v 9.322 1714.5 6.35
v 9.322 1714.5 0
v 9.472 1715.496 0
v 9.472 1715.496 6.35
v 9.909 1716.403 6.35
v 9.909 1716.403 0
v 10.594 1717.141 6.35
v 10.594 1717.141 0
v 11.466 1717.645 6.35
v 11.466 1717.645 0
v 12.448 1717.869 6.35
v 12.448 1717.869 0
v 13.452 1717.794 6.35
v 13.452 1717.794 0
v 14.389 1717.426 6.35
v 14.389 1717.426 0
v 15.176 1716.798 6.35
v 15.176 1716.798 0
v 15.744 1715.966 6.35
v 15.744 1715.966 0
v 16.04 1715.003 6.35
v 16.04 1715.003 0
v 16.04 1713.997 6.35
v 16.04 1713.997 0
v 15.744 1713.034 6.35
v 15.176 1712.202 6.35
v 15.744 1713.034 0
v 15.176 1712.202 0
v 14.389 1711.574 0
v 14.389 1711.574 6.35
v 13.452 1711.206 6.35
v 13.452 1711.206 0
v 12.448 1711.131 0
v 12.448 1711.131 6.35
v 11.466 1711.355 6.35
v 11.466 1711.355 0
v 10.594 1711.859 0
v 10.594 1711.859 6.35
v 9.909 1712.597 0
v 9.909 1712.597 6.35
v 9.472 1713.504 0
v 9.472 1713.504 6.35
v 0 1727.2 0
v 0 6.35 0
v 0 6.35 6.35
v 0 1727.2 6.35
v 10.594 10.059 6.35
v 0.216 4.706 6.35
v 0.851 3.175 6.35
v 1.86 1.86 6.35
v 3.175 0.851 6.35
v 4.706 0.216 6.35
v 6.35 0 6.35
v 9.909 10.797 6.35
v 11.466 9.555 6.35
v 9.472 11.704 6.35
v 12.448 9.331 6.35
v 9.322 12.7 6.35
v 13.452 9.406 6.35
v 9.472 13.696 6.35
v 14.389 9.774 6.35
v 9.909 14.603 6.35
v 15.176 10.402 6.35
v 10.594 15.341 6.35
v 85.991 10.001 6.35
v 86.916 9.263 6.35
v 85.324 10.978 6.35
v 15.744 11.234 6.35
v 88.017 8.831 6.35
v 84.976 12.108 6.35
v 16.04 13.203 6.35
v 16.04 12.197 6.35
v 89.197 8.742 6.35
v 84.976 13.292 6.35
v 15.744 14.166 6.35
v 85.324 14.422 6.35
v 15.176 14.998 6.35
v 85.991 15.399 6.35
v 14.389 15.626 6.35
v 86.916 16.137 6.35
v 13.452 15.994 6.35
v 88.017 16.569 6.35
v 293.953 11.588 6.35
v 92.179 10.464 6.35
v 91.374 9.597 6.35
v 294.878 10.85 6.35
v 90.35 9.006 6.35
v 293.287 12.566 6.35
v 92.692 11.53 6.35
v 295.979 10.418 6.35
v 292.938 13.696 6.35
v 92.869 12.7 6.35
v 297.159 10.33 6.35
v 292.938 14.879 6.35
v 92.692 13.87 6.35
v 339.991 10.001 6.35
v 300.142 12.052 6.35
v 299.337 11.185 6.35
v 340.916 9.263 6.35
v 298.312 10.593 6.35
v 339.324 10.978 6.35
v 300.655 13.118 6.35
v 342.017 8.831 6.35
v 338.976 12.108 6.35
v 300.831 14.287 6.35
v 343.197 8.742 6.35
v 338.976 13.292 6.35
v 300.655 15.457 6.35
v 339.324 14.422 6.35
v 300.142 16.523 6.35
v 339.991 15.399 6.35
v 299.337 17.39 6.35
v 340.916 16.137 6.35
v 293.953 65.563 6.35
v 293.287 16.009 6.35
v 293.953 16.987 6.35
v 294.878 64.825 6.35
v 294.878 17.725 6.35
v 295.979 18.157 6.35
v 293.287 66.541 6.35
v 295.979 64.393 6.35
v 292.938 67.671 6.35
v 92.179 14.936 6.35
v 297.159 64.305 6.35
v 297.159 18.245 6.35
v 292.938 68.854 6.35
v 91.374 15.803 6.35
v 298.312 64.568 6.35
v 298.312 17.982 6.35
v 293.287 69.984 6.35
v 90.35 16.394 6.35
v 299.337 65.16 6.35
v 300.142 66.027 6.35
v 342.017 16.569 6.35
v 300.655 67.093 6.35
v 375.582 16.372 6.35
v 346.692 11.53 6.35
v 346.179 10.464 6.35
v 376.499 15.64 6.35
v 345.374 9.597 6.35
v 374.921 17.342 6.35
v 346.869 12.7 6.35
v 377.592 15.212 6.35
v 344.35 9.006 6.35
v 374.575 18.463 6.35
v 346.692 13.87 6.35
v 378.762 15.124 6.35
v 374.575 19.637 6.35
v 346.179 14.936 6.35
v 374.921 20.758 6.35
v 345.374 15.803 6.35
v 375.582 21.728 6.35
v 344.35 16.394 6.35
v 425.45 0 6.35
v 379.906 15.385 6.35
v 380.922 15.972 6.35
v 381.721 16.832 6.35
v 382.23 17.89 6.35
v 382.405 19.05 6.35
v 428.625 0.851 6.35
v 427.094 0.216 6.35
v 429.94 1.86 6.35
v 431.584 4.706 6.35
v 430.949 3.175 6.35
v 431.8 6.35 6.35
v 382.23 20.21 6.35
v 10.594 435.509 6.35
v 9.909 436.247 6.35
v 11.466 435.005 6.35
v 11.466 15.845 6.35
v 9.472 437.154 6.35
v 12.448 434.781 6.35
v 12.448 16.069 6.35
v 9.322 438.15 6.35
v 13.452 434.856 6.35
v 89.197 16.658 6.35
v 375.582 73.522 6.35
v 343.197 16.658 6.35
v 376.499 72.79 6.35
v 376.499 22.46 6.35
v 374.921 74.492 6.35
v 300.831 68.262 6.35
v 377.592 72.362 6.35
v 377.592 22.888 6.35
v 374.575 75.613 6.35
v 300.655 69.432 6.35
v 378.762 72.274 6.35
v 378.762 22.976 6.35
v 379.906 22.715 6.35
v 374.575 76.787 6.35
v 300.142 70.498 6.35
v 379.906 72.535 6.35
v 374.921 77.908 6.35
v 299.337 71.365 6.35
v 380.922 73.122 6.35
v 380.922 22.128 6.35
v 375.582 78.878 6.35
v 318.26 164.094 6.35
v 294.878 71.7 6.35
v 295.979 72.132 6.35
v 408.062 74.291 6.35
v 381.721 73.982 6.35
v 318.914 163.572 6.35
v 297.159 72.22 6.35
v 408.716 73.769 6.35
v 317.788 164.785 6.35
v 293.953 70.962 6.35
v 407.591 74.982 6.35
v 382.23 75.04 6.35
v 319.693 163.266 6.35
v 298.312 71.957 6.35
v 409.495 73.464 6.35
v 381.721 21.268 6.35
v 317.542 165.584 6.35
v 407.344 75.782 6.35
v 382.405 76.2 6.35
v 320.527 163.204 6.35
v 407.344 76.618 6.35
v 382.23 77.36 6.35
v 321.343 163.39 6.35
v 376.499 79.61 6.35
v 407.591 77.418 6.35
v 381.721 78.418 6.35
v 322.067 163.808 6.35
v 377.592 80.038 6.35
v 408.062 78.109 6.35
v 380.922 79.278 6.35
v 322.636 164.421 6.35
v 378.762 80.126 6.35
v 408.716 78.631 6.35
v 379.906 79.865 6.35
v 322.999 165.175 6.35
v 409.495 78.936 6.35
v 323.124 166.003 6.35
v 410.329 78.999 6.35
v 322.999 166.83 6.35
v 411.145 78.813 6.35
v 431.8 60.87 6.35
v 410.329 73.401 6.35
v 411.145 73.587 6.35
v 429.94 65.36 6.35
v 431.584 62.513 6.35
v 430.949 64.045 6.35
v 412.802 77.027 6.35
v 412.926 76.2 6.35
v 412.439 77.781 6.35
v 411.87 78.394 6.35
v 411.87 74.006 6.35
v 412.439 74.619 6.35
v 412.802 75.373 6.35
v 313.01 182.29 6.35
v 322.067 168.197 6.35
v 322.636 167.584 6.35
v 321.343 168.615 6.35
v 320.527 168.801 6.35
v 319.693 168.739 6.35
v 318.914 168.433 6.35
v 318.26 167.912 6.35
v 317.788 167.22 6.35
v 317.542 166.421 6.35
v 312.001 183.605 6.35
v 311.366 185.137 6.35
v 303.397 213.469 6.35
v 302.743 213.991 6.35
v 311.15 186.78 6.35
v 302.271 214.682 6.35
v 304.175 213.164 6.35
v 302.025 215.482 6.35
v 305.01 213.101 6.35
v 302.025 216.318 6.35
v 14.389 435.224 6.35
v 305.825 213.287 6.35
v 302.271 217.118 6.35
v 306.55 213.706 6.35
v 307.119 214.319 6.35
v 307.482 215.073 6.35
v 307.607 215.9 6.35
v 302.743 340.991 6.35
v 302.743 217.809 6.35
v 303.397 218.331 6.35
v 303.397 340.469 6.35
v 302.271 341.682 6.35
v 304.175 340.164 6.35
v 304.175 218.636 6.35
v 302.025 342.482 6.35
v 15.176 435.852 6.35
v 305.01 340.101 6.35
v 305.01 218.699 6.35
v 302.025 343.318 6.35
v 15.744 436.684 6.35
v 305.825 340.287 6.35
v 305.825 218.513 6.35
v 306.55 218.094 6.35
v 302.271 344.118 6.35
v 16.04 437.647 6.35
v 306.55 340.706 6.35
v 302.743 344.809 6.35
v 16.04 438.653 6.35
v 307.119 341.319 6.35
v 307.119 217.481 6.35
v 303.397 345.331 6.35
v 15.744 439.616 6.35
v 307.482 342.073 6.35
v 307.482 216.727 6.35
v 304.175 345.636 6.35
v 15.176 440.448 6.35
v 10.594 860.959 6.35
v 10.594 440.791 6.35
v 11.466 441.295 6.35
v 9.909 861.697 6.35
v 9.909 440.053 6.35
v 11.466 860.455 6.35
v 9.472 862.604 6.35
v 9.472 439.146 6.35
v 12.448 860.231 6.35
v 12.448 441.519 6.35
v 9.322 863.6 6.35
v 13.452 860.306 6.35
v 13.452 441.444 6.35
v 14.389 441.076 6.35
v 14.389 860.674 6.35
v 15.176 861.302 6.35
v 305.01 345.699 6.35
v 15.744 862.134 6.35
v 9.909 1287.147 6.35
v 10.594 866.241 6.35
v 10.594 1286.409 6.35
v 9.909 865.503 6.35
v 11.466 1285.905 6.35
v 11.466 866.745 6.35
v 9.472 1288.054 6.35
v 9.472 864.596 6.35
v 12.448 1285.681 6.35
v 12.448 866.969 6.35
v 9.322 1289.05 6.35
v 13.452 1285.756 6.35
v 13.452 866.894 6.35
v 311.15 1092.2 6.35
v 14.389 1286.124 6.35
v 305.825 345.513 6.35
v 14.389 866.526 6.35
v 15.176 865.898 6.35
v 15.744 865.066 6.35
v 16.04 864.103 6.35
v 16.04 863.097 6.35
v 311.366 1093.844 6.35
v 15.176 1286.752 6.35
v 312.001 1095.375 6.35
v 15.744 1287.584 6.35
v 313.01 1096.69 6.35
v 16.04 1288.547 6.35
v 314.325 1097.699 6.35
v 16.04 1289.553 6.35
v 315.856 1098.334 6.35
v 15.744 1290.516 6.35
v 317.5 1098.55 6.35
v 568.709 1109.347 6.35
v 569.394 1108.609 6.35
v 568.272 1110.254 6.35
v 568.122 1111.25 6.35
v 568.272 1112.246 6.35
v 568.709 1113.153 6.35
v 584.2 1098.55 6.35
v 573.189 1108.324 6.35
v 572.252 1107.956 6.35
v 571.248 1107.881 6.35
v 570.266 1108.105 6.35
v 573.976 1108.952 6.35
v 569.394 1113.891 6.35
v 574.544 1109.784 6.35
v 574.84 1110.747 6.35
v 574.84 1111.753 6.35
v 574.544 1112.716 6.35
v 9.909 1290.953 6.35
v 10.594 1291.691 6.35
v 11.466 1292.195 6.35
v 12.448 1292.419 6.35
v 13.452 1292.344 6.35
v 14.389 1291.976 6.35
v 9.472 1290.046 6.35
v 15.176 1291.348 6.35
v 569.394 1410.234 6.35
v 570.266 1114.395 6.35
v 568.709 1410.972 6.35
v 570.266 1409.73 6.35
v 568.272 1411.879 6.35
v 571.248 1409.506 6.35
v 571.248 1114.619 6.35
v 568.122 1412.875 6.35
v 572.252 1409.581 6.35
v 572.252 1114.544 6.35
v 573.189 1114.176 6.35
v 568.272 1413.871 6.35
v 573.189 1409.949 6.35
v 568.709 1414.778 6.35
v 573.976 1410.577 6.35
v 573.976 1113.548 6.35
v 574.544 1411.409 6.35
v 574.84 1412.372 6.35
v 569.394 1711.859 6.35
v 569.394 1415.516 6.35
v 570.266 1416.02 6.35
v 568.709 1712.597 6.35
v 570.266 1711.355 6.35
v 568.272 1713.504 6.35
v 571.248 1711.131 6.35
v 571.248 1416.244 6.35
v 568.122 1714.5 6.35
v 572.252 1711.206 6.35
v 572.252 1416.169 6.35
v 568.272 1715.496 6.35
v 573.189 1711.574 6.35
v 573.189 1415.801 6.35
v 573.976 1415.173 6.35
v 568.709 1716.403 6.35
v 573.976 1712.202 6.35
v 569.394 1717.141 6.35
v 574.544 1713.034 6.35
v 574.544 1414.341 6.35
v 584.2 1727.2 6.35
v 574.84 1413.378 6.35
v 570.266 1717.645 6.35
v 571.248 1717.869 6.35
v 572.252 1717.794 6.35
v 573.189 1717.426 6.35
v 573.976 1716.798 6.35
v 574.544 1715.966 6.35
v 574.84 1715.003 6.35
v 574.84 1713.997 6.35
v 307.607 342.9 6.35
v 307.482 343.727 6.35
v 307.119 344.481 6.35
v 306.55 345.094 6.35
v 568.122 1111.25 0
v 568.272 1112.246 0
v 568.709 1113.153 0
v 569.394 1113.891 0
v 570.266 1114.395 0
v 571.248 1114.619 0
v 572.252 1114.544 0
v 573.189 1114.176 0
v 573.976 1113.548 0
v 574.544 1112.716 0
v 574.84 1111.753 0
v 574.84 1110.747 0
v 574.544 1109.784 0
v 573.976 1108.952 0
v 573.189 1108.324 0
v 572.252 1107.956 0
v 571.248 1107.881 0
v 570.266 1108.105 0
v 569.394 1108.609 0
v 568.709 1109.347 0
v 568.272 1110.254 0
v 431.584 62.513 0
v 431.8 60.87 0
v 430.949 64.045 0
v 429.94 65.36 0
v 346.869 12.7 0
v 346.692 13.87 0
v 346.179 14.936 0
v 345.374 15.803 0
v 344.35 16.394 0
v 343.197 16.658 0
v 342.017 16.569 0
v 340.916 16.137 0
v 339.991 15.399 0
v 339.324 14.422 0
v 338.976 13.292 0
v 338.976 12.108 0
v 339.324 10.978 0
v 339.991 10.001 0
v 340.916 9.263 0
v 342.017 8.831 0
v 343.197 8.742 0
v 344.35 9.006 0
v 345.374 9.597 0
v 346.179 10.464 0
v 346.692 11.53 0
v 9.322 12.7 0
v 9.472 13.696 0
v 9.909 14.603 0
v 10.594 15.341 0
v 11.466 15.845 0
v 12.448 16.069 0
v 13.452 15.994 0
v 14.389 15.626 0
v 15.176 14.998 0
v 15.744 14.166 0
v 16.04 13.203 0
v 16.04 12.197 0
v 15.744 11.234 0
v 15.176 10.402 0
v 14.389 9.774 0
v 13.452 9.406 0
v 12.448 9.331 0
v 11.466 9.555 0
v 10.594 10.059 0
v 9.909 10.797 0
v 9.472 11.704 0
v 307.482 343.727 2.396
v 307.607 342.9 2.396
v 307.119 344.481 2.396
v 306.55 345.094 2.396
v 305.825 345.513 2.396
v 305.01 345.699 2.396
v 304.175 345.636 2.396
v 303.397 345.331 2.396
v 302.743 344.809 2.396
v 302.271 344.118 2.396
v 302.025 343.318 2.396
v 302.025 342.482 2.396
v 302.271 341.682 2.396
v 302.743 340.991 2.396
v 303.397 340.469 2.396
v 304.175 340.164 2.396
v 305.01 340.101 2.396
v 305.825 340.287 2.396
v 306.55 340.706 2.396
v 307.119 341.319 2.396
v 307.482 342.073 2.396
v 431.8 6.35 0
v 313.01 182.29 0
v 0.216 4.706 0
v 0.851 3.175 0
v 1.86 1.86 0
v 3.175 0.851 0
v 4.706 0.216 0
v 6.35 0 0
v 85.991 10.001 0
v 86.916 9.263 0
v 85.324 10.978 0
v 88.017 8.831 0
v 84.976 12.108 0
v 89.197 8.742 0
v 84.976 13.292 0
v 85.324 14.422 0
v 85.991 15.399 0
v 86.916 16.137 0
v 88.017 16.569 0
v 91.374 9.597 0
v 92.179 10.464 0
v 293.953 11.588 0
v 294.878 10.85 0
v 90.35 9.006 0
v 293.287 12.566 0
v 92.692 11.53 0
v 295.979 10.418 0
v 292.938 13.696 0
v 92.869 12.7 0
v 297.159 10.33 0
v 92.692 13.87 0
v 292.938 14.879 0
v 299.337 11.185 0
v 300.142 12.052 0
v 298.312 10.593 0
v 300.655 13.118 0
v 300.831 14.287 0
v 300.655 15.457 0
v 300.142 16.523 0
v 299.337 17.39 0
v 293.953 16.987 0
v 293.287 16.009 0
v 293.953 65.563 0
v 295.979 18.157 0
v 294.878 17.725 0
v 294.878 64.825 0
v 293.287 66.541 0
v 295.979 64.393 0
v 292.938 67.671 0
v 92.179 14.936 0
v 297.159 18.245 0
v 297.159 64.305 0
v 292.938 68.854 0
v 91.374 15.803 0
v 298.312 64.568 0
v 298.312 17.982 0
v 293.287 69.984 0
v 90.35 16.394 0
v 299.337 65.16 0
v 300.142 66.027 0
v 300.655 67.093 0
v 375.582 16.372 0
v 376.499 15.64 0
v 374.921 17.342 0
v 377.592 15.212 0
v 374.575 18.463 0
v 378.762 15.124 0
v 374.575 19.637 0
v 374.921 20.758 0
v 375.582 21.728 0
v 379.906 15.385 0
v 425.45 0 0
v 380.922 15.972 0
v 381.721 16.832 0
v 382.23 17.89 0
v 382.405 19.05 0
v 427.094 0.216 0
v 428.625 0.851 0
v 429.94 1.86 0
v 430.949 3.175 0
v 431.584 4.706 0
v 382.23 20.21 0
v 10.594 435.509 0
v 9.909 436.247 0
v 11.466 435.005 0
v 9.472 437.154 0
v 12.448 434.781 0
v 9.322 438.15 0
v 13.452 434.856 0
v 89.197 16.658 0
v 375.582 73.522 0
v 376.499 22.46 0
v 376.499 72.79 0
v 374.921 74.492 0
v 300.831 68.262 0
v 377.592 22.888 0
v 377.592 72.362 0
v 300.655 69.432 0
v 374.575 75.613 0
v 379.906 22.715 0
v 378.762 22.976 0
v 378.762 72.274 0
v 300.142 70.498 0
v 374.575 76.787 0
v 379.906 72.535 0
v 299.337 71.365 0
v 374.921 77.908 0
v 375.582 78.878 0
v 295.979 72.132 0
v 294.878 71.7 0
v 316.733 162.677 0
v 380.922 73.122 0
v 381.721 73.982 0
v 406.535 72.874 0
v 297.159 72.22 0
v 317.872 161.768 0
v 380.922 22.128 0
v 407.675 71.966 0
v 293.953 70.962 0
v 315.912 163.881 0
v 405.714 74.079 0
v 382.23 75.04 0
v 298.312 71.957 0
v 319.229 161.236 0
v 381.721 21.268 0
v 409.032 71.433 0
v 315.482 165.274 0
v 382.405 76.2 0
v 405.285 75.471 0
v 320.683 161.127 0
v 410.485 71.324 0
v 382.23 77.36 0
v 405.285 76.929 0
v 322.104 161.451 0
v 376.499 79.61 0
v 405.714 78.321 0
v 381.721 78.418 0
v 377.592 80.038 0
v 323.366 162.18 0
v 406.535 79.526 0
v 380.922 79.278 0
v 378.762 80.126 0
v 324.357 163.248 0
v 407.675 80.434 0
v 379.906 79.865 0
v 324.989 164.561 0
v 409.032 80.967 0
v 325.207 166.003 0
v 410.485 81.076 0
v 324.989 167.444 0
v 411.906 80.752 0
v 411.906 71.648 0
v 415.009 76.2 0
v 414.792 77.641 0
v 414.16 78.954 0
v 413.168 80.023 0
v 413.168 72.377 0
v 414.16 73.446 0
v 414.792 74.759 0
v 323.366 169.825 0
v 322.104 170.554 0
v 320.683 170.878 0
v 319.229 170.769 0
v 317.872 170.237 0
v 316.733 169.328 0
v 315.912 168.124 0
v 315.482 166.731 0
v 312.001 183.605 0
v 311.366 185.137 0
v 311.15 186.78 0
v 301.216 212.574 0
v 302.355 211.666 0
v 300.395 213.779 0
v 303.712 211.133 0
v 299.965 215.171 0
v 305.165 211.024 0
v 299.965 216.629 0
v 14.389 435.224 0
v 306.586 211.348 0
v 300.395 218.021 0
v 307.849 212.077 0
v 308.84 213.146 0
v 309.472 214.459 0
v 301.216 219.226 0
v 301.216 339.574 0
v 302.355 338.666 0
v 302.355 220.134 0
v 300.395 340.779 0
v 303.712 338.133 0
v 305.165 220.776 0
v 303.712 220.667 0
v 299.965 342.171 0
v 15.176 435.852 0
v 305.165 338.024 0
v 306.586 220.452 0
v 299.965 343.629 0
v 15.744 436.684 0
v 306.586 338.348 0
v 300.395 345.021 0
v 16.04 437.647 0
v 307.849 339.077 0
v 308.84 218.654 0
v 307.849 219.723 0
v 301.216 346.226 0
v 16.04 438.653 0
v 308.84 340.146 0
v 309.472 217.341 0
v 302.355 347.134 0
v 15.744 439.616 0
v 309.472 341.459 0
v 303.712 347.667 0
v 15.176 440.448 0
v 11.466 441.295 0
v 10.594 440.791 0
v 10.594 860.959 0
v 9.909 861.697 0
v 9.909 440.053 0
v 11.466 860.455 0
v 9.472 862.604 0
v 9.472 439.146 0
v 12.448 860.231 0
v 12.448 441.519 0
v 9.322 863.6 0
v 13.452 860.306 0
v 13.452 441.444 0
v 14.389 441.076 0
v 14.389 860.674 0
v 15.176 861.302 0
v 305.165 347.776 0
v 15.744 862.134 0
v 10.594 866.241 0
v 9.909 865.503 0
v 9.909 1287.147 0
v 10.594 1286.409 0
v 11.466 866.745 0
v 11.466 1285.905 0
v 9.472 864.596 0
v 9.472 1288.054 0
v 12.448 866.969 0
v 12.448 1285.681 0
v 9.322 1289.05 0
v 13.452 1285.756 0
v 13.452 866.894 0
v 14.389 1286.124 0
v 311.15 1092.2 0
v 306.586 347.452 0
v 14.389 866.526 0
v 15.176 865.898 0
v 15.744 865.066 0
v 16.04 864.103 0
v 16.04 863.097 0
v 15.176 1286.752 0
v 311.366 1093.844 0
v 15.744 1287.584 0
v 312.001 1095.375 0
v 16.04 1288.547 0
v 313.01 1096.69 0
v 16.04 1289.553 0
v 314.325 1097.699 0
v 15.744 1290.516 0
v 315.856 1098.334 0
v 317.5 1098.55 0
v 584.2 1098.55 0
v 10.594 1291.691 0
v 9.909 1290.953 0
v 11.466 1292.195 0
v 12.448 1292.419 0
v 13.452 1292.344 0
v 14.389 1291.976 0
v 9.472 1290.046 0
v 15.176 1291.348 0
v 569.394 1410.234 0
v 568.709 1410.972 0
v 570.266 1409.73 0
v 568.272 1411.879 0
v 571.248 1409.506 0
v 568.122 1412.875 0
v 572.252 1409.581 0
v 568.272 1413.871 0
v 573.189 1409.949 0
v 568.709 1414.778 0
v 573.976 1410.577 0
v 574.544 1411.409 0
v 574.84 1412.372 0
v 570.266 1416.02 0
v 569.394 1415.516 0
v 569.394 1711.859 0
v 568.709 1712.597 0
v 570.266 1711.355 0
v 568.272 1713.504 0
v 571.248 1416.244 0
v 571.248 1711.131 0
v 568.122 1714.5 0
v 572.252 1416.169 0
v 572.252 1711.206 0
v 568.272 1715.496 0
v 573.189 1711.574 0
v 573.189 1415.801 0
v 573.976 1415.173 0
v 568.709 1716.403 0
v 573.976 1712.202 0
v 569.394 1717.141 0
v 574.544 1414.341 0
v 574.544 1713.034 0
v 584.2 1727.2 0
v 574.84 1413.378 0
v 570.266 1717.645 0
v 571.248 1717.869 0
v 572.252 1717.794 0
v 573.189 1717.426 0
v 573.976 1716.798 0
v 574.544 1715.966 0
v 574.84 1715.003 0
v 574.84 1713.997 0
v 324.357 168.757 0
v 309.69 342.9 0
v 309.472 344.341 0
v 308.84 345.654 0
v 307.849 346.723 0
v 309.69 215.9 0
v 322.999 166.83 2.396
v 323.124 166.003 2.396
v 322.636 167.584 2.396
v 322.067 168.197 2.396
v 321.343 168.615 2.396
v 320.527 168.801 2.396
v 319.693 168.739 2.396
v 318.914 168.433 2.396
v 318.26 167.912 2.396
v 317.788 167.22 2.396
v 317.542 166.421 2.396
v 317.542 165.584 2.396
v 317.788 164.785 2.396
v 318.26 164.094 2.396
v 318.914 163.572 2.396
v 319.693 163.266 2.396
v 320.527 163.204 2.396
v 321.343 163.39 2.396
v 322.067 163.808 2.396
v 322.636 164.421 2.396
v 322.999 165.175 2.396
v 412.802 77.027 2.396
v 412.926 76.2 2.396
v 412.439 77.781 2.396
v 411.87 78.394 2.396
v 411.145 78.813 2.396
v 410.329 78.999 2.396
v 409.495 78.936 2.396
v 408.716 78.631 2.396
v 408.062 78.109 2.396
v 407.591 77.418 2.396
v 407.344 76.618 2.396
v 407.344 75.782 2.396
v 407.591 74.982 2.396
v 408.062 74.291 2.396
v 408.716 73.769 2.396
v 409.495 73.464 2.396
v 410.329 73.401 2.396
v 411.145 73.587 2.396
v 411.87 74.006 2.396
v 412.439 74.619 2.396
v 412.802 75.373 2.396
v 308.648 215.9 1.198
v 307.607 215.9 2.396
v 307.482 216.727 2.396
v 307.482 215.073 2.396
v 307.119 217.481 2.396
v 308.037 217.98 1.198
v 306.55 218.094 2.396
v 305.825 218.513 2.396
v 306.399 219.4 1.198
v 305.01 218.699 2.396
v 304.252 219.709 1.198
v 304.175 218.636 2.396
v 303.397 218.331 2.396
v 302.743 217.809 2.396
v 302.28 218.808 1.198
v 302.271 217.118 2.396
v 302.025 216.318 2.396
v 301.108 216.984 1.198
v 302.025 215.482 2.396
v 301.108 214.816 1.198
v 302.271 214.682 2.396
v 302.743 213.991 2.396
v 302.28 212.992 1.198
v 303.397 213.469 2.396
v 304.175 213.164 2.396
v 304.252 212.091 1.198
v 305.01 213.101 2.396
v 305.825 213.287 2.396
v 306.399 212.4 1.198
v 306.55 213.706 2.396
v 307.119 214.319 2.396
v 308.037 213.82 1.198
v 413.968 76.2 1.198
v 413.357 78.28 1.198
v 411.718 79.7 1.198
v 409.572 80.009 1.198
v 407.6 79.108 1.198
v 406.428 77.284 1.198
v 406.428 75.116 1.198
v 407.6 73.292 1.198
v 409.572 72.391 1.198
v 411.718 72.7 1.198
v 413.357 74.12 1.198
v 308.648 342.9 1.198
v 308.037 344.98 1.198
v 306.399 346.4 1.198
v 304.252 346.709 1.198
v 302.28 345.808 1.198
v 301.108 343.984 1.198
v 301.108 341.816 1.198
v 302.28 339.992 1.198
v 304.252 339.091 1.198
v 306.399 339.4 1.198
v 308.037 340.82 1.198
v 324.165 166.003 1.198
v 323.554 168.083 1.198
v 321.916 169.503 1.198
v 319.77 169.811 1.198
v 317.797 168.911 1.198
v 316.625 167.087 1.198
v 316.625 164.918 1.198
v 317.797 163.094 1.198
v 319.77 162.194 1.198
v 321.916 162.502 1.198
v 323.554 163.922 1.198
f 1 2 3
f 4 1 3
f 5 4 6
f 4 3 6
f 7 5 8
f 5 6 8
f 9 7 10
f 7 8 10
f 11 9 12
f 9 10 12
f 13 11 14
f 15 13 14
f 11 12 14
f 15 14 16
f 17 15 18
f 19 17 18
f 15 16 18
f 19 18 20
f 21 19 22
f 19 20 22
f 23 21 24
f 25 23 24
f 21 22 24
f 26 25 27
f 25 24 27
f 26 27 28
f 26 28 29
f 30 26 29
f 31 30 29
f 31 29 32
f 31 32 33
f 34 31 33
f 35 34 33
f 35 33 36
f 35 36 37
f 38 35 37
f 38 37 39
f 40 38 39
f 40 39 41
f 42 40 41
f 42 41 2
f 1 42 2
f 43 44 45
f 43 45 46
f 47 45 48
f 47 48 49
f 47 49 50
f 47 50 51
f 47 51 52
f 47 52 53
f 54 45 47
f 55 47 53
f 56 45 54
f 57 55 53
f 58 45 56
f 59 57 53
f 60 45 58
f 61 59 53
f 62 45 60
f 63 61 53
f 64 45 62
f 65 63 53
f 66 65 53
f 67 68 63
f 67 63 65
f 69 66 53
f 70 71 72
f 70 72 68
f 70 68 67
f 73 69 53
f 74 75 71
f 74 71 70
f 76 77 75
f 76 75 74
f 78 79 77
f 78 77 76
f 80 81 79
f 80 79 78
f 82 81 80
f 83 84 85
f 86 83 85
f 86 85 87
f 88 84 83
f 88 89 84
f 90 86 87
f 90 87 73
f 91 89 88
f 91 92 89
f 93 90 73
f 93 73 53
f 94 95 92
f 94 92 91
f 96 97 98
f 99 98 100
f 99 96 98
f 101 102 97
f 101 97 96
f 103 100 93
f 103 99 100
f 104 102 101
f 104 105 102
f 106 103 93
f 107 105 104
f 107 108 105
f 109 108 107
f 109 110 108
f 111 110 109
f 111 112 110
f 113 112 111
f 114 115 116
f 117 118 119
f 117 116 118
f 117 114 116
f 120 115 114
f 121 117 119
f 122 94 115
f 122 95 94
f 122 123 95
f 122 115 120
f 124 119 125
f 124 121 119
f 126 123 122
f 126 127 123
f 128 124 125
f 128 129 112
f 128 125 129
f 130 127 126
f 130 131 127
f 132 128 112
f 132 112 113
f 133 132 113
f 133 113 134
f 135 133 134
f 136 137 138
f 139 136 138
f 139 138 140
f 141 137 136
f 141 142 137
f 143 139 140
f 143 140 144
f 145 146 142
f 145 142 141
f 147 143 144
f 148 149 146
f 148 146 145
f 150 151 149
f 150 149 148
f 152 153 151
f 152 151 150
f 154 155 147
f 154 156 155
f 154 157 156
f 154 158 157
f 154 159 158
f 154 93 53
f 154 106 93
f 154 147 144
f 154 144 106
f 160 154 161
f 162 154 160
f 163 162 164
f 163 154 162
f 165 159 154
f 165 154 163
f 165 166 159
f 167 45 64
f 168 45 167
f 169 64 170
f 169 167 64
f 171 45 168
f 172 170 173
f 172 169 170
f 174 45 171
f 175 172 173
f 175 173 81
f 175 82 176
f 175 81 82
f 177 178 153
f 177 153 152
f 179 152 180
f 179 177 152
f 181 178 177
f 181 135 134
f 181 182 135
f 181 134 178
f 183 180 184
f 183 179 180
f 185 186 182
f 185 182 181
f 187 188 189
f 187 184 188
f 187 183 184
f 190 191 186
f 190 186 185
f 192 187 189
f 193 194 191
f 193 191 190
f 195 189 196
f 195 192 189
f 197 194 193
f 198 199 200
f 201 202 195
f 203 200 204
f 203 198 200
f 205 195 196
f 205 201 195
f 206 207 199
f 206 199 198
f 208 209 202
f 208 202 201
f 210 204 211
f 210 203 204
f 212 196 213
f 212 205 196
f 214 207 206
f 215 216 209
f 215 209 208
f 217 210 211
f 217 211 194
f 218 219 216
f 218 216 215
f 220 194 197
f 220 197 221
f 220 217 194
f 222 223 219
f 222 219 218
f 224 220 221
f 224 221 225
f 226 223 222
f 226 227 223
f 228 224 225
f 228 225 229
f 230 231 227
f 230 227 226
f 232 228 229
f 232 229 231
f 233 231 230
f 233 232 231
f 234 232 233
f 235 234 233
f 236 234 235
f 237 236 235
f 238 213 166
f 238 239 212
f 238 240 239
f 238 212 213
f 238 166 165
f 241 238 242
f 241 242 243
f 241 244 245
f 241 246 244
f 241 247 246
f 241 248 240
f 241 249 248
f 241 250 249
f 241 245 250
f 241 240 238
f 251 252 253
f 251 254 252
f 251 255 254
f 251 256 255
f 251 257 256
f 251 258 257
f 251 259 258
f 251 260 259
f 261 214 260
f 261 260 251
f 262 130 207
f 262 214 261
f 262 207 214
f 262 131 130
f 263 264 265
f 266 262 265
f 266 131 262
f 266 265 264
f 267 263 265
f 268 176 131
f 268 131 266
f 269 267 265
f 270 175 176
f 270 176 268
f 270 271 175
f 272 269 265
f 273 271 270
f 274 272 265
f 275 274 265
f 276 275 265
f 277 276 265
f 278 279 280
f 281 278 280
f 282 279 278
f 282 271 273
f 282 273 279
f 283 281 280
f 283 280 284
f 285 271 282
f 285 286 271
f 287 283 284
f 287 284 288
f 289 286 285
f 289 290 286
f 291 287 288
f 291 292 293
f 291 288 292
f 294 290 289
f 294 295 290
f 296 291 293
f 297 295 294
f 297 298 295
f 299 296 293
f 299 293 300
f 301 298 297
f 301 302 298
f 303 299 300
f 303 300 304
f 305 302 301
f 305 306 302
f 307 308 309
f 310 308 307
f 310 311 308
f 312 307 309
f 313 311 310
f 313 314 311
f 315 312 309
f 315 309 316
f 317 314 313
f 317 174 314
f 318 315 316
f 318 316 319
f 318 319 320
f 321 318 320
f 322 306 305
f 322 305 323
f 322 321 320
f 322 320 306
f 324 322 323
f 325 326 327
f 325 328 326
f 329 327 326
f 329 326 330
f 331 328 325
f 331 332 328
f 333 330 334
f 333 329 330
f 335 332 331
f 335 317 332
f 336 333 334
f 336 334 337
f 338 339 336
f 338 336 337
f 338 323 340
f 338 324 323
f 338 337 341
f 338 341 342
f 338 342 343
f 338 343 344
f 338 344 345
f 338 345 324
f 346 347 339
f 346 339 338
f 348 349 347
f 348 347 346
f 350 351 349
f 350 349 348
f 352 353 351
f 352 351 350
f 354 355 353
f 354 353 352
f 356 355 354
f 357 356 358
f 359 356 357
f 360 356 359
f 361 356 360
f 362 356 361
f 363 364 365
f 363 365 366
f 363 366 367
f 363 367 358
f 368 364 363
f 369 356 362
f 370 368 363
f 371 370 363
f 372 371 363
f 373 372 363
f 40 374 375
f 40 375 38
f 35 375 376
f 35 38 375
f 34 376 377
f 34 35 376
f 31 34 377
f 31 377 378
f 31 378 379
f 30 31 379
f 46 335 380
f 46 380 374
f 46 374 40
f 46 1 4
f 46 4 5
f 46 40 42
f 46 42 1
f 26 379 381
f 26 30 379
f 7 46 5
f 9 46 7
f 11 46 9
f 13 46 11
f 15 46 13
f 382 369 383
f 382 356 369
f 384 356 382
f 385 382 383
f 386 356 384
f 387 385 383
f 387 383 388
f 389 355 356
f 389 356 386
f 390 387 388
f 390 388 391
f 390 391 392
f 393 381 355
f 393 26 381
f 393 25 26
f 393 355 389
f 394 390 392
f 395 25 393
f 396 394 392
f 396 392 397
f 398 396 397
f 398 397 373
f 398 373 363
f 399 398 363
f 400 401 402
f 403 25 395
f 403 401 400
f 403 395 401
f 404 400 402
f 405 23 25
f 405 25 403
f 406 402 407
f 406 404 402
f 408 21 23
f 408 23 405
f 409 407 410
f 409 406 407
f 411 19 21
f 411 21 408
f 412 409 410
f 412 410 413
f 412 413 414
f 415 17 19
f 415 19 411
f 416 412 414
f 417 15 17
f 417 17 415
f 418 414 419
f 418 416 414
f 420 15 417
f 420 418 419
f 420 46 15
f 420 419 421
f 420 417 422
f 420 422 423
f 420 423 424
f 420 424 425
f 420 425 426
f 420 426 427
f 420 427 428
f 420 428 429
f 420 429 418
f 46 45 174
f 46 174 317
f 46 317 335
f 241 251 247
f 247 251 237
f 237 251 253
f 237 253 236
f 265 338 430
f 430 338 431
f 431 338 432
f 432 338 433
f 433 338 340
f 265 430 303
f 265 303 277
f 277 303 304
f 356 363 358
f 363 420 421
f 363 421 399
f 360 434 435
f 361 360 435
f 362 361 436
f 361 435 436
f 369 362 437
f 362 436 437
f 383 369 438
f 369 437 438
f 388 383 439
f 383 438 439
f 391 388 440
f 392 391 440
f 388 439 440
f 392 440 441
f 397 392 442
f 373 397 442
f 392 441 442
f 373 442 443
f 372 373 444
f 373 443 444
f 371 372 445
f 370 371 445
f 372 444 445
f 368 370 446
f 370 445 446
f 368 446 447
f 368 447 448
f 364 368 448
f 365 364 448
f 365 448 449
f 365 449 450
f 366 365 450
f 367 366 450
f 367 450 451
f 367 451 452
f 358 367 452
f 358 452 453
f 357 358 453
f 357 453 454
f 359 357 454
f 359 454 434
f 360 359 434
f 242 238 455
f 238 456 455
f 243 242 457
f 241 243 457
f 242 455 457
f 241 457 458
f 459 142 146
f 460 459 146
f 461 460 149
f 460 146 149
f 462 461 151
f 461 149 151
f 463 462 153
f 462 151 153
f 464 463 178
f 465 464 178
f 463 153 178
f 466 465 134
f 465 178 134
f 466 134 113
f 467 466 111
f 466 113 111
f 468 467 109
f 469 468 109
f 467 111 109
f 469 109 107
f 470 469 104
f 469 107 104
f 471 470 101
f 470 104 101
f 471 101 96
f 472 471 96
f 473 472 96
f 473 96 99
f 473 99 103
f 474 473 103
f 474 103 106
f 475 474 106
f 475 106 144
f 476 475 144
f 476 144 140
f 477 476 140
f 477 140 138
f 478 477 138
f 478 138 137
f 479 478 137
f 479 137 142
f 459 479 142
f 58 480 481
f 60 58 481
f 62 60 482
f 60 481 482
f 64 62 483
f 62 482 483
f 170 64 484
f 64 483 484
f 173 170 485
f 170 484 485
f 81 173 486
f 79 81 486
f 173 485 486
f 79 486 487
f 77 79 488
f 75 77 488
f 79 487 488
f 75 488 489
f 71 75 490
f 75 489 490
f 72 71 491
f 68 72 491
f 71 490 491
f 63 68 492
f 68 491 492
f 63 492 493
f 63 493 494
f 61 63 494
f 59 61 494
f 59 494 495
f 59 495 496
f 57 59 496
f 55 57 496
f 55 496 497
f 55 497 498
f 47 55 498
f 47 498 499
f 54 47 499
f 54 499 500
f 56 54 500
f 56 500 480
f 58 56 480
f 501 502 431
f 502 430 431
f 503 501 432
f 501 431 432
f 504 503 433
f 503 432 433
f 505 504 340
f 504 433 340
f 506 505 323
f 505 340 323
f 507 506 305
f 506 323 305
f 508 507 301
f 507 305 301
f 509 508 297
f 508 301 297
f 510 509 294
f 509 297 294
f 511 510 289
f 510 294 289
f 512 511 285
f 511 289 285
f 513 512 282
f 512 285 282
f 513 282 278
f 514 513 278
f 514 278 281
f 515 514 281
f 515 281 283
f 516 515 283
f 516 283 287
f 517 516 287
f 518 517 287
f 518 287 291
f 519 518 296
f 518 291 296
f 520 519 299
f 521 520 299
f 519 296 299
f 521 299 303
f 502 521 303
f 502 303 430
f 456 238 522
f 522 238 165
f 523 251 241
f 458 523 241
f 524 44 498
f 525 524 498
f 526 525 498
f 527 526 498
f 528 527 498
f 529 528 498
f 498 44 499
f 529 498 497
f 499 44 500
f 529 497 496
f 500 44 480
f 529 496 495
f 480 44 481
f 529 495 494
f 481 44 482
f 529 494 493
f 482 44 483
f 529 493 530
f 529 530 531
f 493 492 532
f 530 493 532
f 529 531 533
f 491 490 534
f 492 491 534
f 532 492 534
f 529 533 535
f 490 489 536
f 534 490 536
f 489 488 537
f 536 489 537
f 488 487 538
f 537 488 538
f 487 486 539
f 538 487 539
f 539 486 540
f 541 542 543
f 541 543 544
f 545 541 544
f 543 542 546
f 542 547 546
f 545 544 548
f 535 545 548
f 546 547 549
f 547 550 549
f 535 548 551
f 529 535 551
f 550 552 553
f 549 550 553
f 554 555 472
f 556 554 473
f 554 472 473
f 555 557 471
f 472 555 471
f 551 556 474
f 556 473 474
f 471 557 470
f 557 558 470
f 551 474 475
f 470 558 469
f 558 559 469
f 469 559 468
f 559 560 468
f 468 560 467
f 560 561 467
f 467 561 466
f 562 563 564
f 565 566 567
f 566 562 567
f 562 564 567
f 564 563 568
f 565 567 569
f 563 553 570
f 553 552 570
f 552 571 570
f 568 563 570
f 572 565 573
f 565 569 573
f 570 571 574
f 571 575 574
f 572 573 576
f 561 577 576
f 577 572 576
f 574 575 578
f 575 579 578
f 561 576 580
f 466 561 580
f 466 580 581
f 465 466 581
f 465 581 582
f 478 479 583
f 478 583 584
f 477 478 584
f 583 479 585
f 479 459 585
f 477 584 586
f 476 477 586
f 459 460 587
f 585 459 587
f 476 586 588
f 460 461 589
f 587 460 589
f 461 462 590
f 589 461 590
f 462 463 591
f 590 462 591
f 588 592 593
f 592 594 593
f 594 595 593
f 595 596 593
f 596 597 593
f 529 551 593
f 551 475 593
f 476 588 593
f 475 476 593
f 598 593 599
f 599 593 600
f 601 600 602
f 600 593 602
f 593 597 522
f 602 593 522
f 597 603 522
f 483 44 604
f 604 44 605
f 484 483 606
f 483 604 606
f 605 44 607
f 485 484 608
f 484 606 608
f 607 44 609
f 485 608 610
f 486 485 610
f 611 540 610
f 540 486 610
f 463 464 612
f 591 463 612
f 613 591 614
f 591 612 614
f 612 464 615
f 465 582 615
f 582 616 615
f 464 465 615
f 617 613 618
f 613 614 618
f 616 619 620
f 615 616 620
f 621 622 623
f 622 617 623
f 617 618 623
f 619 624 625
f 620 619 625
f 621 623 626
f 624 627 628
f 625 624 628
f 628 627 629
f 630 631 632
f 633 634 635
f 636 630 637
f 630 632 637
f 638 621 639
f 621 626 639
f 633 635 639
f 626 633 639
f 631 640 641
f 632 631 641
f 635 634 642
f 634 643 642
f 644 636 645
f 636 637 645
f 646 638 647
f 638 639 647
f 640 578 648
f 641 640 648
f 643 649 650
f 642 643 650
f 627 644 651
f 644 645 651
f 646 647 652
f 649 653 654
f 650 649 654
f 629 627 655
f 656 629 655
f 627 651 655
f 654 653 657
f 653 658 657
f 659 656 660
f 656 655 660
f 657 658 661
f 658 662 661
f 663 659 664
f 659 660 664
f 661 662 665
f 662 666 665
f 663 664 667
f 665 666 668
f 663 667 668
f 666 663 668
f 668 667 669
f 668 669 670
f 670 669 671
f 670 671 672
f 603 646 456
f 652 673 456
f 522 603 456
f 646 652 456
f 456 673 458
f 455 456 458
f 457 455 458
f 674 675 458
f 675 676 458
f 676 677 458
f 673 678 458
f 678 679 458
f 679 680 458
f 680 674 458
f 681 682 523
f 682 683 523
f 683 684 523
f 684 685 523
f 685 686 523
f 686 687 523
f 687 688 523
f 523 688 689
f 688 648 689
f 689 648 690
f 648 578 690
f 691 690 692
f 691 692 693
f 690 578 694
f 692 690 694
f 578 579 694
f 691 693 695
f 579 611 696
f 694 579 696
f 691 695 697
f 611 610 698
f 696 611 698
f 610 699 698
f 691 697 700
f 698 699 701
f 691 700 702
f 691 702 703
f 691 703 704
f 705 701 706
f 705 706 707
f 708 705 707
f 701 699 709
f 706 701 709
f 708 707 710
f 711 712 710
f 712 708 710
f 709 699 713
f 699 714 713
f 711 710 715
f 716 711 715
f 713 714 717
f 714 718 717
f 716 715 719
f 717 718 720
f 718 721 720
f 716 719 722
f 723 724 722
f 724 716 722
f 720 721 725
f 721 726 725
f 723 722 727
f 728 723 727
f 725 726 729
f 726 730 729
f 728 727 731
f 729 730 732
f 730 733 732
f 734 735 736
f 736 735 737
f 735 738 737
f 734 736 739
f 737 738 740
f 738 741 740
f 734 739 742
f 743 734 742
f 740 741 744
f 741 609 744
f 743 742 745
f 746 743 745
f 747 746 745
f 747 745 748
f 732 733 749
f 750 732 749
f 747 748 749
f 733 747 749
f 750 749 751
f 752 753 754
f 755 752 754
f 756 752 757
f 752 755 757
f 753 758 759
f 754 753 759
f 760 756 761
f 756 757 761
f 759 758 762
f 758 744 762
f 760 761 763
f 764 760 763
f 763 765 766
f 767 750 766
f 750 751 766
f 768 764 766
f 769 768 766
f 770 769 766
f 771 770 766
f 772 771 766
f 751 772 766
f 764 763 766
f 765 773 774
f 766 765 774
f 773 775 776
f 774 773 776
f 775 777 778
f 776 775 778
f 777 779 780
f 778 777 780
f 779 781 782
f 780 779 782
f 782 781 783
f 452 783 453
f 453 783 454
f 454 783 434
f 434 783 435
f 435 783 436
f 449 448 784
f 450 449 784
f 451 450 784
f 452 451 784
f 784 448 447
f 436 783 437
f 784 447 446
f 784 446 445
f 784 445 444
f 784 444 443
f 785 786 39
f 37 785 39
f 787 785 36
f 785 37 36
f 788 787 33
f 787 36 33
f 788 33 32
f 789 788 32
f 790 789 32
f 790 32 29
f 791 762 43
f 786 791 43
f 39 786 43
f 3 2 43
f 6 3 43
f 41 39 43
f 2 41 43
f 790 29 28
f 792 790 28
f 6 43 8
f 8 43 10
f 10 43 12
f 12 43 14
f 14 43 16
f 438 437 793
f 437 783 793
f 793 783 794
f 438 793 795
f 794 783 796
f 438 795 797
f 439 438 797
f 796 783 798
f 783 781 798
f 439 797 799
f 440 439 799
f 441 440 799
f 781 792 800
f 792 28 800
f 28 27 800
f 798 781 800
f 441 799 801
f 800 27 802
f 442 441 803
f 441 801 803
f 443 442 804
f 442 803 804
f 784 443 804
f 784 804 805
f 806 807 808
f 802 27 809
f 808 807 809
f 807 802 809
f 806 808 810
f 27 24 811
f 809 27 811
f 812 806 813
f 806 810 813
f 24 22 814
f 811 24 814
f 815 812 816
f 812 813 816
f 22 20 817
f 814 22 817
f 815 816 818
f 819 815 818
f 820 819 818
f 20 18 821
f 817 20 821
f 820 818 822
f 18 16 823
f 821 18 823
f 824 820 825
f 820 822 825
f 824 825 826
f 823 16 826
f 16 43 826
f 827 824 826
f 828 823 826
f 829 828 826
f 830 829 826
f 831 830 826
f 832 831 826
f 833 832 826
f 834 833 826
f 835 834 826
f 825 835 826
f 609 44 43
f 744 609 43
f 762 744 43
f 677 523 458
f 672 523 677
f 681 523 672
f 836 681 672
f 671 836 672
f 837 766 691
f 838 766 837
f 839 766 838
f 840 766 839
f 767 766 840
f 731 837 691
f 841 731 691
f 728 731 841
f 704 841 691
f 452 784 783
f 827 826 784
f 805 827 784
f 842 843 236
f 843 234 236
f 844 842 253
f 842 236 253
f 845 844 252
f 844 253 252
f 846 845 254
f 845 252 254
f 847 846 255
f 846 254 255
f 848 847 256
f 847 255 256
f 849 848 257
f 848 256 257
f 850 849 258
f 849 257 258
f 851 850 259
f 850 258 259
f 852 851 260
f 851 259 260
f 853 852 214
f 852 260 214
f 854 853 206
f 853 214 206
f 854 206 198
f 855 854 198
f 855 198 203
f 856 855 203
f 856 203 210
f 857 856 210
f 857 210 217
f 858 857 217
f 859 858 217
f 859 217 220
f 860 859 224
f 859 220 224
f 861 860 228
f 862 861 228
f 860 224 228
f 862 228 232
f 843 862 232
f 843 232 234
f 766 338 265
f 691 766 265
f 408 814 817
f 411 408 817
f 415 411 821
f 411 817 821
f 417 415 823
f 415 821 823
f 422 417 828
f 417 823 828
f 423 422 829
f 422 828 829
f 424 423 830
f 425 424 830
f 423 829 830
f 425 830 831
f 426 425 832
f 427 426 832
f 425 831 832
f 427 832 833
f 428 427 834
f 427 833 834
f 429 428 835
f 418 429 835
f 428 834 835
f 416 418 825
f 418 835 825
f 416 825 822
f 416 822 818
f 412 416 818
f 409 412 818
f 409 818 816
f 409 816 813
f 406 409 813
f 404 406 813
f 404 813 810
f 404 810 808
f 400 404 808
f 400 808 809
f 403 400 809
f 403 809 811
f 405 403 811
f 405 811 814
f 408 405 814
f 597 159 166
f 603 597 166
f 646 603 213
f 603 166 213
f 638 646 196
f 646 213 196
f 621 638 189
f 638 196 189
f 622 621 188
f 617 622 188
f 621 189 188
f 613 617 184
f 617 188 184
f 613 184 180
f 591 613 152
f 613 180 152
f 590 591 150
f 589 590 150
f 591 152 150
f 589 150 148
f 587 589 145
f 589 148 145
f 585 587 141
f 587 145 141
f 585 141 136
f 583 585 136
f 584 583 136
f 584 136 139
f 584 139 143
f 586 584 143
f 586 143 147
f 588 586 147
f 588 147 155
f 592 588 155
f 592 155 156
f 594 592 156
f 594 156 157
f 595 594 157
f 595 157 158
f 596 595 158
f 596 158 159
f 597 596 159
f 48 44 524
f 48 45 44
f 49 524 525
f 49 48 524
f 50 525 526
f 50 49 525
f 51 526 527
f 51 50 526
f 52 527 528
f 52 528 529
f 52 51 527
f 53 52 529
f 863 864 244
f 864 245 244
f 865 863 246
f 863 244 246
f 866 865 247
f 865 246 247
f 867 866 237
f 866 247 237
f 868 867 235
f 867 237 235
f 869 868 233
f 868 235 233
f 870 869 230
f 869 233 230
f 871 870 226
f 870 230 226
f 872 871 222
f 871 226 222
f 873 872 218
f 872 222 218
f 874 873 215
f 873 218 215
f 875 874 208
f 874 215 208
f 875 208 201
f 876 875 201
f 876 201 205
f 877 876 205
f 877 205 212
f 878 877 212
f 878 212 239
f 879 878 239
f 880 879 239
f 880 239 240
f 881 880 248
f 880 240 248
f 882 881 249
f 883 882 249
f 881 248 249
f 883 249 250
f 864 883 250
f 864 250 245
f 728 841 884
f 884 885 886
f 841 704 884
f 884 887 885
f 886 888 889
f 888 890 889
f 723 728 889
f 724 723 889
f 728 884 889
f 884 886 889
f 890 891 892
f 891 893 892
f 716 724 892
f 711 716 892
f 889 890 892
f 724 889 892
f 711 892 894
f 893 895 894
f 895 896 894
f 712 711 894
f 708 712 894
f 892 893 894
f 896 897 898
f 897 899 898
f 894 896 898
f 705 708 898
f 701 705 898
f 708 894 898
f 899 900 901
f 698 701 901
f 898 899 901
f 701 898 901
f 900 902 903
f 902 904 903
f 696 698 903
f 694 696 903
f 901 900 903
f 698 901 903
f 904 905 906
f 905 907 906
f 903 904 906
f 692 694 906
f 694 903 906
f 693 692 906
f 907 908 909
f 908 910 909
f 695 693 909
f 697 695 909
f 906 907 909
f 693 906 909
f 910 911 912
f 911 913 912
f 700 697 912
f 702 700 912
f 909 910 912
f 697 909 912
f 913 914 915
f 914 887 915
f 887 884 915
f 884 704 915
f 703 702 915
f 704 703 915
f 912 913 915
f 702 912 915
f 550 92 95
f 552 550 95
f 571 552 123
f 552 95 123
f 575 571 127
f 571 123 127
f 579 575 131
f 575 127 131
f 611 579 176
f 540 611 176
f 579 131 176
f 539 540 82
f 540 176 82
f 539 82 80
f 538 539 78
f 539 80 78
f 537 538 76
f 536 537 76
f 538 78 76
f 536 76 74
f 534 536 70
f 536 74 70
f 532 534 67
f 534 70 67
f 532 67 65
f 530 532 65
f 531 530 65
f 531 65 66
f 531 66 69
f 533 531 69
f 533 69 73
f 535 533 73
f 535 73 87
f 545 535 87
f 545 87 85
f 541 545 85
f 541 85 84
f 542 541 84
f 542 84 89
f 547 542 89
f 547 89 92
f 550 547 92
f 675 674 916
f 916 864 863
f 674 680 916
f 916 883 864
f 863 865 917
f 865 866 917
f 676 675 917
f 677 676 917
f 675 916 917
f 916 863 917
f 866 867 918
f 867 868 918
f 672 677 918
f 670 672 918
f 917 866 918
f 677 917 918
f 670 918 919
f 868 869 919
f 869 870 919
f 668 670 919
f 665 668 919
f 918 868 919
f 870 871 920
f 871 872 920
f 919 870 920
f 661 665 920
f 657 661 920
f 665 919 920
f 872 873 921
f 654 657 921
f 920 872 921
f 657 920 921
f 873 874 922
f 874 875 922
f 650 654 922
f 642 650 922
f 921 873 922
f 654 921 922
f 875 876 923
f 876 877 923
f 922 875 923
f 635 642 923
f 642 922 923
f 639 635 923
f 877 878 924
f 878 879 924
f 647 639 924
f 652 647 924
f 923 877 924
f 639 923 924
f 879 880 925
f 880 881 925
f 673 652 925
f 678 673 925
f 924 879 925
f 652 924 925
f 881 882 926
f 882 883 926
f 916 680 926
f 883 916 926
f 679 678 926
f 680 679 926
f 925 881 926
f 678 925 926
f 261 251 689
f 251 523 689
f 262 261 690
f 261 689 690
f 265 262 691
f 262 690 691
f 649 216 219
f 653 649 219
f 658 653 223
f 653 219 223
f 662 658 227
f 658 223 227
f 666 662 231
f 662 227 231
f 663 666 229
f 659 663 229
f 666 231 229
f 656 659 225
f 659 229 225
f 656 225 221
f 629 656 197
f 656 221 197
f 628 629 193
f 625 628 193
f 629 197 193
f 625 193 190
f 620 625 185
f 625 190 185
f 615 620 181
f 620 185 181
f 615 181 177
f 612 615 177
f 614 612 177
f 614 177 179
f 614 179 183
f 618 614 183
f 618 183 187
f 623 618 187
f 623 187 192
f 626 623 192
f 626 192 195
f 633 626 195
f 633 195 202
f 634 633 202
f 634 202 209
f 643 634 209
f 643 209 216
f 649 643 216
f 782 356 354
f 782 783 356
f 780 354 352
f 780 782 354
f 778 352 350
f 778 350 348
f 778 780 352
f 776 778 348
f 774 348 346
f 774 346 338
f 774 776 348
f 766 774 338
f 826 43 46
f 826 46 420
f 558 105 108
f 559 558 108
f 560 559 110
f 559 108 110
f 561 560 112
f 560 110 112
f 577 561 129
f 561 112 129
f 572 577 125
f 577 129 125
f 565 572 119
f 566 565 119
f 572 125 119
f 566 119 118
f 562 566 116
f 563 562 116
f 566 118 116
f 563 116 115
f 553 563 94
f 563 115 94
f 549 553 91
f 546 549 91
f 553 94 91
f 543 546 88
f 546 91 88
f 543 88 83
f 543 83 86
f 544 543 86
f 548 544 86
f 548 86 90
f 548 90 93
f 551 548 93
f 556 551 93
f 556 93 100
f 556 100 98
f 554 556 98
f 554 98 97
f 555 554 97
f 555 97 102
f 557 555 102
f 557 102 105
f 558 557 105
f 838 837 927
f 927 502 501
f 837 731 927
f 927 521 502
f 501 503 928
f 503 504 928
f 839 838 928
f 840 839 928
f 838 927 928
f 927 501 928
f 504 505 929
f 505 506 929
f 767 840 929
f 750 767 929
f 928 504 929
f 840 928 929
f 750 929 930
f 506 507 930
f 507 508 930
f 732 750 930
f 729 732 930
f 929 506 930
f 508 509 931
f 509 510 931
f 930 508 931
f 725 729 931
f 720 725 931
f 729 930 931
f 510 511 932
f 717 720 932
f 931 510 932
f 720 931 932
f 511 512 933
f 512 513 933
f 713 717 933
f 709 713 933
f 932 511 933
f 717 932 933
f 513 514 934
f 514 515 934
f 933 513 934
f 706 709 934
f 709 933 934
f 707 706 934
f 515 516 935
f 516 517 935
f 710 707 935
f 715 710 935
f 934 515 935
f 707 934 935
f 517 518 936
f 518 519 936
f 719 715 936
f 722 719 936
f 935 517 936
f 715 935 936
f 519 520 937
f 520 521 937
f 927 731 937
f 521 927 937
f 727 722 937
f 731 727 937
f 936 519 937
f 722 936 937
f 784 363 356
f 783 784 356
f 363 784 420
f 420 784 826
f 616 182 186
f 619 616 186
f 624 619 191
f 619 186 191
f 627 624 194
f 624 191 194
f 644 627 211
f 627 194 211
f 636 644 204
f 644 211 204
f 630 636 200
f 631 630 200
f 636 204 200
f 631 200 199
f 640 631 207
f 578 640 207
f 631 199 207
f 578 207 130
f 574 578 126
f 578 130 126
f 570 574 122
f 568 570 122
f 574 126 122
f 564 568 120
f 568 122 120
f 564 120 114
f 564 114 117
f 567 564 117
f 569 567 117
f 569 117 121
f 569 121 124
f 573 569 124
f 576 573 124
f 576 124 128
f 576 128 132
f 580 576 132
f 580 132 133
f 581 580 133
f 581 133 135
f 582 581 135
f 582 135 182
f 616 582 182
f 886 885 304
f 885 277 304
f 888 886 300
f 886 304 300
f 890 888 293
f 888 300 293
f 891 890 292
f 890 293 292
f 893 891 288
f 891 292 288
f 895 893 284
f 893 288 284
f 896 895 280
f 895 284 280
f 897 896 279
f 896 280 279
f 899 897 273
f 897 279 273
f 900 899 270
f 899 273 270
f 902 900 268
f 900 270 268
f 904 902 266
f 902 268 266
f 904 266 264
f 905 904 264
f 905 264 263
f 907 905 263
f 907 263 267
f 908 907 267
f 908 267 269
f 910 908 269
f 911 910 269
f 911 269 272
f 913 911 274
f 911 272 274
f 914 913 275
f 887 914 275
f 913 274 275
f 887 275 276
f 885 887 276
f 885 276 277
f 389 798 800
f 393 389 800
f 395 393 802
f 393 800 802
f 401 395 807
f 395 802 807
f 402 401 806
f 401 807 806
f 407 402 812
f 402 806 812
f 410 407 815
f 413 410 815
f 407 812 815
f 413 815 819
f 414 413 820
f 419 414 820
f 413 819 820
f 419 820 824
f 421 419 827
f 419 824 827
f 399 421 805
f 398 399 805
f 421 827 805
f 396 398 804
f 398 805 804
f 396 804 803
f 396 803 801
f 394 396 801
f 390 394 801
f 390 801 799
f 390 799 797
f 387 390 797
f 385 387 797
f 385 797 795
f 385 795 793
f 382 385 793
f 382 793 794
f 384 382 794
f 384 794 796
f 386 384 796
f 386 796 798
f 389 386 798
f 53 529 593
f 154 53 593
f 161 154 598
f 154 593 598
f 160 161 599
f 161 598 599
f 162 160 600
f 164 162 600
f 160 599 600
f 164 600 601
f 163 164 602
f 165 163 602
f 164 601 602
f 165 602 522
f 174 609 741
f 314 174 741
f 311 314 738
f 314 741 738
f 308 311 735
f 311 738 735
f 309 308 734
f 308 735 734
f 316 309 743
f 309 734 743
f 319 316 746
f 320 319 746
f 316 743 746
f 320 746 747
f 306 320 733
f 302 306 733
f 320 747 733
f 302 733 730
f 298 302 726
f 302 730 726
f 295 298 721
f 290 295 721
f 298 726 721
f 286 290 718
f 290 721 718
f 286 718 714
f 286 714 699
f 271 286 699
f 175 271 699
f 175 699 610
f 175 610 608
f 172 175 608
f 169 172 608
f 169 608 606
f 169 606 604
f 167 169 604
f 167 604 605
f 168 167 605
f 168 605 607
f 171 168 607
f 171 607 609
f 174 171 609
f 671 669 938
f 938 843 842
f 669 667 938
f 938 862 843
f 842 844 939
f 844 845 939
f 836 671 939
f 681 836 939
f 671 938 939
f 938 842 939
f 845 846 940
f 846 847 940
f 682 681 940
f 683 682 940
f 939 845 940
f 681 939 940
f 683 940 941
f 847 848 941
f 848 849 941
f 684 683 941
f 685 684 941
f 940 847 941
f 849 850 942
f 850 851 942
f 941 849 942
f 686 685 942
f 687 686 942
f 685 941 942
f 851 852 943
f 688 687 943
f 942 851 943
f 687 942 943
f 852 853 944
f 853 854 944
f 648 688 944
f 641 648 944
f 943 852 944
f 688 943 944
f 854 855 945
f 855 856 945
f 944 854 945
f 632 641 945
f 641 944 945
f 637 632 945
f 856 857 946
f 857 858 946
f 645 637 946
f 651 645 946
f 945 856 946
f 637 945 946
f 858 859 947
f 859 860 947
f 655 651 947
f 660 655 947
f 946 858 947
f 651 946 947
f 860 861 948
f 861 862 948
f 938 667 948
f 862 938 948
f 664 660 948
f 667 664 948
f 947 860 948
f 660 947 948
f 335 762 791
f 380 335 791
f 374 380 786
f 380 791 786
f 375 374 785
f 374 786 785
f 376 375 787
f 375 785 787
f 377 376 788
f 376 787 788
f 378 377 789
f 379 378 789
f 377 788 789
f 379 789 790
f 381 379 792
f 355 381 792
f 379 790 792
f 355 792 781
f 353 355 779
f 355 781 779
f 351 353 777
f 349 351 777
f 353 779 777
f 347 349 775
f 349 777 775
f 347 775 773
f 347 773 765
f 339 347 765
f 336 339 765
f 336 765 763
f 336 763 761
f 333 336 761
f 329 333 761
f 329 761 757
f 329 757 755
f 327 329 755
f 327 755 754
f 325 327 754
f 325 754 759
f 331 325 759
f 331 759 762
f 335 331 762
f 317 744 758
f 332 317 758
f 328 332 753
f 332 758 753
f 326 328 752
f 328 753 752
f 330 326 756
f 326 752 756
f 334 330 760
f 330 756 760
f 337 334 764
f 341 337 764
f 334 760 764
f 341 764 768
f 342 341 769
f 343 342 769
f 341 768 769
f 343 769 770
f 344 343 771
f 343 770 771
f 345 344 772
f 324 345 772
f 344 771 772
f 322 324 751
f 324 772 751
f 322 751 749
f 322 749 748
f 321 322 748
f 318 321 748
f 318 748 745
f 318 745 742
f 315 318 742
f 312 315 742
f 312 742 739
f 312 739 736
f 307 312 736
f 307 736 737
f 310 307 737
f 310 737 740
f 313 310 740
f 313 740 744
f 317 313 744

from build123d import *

# Parameters (mm, degrees)
SKETCH2_W                                       = 584.2
SKETCH2_H                                       = 1727.2
BOSS_EXTRUDE1_DEPTH                             = 6.35
CUT_EXTRUDE1_DEPTH                              = 7.35
H_0_266_DIAMETER_HOLE1_D                        = 6.7564
FILLET1_R                                       = 6.35
SKETCH7_R                                       = 3.96875
CUT_EXTRUDE2_DEPTH                              = 12.7
CSK_FOR_10_FLAT_HEAD_MACHINE_SCREW1_D           = 5.6134
CSK_FOR_10_FLAT_HEAD_MACHINE_SCREW1_CSINK_D     = 9.779
CSK_FOR_10_FLAT_HEAD_MACHINE_SCREW1_CSINK_ANGLE = 82
SKETCH15_R                                      = 3.937
CUT_EXTRUDE3_DEPTH                              = 7.35
F_5_16_0_3125_DIAMETER_HOLE1_D                  = 7.9375


with BuildPart() as part:
    # Sketch2 → Boss-Extrude1 (new body)
    with BuildSketch(Plane.XY):
        with Locations((292.1, 863.6)):
            Rectangle(SKETCH2_W, SKETCH2_H)
    extrude(amount=BOSS_EXTRUDE1_DEPTH)

    # Sketch3 → Cut-Extrude1 (cut, through all)
    with BuildSketch(Plane.XY.offset(6.35)):
        Polygon((584.2, 1098.55), (311.15, 1098.55), (311.15, 184.15), (431.8, 63.5), (431.8, 0), (584.2, 0), align=None)
    extrude(amount=-CUT_EXTRUDE1_DEPTH, mode=Mode.SUBTRACT)

    # H (0.266) Diameter Hole1 (through all)
    with Locations(Plane.XY.offset(6.35)):
        with Locations((12.7, 1714.5), (12.7, 1289.05), (12.7, 863.6), (12.7, 438.15), (12.7, 12.7), (571.5, 1111.25), (571.5, 1412.875), (571.5, 1714.5)):
            Hole(H_0_266_DIAMETER_HOLE1_D / 2)

    # Fillet1
    fillet1_edges = [part.edges().sort_by_distance(p)[0] for p in [
        (431.8, 0, 3.175),
        (431.8, 63.5, 3.175),
        (311.15, 184.15, 3.175),
        (311.15, 1098.55, 3.175),
        (0, 0, 3.175),
    ]]
    fillet(fillet1_edges, radius=FILLET1_R)

    # Sketch7 → Cut-Extrude2 (cut)
    with BuildSketch(Plane.XY.offset(6.35)):
        with Locations((88.9, 12.7)):
            Circle(SKETCH7_R)
        with Locations((342.9, 12.7)):
            Circle(SKETCH7_R)
    extrude(amount=-CUT_EXTRUDE2_DEPTH, mode=Mode.SUBTRACT)

    # CSK for #10 Flat Head Machine Screw1 (through all)
    with Locations(Plane(origin=(0, 0, 0), x_dir=(-1, 0, 0), z_dir=(0, 0, -1))):
        with Locations((-304.8, 342.9), (-304.8, 215.9), (-320.317182668, 166.002561211), (-410.119743879, 76.2)):
            CounterSinkHole(CSK_FOR_10_FLAT_HEAD_MACHINE_SCREW1_D / 2, CSK_FOR_10_FLAT_HEAD_MACHINE_SCREW1_CSINK_D / 2, counter_sink_angle=CSK_FOR_10_FLAT_HEAD_MACHINE_SCREW1_CSINK_ANGLE)

    # Sketch15 → Cut-Extrude3 (cut, through all)
    with BuildSketch(Plane.XY.offset(6.35)):
        with Locations((378.46762, 19.05)):
            Circle(SKETCH15_R)
        with Locations((378.46762, 76.2)):
            Circle(SKETCH15_R)
    extrude(amount=-CUT_EXTRUDE3_DEPTH, mode=Mode.SUBTRACT)

    # 5/16 (0.3125) Diameter Hole1 (through all)
    with Locations(Plane(origin=(0, 0, 0), x_dir=(-1, 0, 0), z_dir=(0, 0, -1))):
        with Locations((-296.8625, 68.2625), (-296.8625, 14.2875)):
            Hole(F_5_16_0_3125_DIAMETER_HOLE1_D / 2)


solid = part.part
